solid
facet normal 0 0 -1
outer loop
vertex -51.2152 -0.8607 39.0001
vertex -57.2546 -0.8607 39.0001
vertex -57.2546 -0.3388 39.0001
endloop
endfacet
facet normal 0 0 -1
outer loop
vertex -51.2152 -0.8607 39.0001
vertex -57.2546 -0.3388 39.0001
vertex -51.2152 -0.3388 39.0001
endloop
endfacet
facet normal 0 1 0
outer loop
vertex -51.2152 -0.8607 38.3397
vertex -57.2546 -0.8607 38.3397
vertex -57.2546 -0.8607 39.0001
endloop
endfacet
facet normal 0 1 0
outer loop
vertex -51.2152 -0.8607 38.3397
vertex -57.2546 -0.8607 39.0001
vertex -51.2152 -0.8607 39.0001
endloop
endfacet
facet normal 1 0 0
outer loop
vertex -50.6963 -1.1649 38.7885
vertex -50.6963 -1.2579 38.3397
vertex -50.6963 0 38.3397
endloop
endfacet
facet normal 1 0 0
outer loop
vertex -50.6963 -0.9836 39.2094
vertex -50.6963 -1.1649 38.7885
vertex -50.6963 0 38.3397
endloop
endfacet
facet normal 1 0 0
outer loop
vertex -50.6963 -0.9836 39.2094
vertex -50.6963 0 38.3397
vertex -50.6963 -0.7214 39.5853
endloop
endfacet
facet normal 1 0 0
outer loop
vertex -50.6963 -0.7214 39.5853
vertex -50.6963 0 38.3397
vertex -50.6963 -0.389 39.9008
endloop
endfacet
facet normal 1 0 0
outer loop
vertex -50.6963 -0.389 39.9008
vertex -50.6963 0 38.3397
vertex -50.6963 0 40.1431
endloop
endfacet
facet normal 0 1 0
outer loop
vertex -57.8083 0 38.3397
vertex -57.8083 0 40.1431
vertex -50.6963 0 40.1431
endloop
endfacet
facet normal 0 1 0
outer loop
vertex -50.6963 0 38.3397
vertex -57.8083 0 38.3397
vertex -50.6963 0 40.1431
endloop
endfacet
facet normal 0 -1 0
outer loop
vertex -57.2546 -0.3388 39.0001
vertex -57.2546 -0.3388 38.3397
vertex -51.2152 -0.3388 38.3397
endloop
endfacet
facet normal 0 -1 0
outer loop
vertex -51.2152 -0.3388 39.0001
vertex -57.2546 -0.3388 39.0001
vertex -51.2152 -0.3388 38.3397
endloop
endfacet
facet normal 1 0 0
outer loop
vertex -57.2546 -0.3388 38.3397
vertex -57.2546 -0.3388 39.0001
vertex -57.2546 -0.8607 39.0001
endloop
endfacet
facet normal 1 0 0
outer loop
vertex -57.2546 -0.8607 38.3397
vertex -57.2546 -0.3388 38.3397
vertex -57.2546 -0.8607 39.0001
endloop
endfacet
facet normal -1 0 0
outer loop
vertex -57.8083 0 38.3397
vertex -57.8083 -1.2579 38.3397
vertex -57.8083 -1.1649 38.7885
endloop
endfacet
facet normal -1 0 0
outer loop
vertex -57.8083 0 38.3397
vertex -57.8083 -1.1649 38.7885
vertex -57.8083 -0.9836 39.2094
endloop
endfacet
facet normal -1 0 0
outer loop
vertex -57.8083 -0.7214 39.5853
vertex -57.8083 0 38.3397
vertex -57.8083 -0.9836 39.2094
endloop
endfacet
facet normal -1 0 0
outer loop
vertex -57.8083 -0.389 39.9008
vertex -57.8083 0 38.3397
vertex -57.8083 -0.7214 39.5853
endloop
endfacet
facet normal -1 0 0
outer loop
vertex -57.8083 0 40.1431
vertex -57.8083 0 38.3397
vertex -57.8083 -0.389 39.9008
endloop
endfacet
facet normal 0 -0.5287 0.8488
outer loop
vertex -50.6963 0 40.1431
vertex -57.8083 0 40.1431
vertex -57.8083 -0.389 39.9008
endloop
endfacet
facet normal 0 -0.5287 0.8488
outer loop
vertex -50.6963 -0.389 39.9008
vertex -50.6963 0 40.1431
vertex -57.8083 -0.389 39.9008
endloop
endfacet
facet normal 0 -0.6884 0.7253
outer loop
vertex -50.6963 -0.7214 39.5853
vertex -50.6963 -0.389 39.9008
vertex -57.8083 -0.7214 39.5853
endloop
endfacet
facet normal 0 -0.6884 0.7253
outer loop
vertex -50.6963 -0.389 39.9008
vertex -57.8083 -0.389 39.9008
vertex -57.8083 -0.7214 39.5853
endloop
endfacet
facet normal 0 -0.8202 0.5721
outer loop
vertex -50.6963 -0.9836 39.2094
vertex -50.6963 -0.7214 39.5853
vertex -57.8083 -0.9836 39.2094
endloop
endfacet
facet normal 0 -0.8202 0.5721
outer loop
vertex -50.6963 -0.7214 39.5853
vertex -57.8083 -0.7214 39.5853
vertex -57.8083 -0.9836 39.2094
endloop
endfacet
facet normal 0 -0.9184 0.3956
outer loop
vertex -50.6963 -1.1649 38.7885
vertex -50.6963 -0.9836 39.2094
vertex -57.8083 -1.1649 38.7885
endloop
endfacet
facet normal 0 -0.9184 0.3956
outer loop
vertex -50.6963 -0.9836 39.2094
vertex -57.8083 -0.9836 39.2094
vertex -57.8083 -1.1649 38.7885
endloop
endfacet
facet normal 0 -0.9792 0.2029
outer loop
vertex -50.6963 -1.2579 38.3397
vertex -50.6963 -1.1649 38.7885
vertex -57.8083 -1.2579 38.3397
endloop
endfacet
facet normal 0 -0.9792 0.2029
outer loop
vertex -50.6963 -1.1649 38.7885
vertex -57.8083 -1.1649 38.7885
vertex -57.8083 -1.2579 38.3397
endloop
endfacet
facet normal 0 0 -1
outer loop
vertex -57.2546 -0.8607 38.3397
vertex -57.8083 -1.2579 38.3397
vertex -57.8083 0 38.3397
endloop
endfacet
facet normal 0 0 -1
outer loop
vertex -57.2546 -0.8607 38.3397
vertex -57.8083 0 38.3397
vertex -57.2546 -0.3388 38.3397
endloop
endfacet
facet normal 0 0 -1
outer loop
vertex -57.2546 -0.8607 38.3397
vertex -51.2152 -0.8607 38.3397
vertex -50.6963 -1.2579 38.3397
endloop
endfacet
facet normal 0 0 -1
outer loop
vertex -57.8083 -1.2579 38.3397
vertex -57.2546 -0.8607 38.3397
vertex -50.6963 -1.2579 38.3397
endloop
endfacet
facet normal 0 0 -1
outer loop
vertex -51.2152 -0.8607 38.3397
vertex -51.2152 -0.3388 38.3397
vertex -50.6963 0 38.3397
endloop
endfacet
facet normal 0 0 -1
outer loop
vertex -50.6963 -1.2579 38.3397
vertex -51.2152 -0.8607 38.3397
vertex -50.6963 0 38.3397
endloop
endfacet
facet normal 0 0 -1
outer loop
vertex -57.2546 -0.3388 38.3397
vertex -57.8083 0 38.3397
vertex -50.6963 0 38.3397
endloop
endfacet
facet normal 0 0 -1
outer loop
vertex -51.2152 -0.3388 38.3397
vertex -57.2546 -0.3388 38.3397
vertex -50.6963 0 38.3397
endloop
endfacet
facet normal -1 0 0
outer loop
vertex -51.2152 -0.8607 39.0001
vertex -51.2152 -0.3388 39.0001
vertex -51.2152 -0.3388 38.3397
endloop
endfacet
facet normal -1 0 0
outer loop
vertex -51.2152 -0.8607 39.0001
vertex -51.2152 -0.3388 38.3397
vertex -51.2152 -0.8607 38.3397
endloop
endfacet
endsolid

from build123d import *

# Parameters (mm, degrees)
F0_W        = 7.112
F0_H        = 1.8034
F1_DEPTH    = 1.27
F2_W        = 6.0393624008
F2_H        = 0.5219200684
F3_DEPTH    = 0.6604
F4_T1_DEPTH = 17.2978356076


# Not quite as in the source:
# - a fillet or chamfer that OpenCascade refuses, or shapes differently, is made with other operations: its cross-section is extruded or revolved along the edge and cut away or added


with BuildPart() as f1:
    # F0 (on Front) → F1 (new body)
    with BuildSketch(Plane.XZ):
        with Locations((-54.2522707031, 39.2414294181)):
            Rectangle(F0_W, F0_H)
    extrude(amount=F1_DEPTH)

    # F2 (on face) → F3 (cut)
    with BuildSketch(Plane(origin=(0, 0, 38.3397294181), x_dir=(1, 0, 0), z_dir=(0, 0, -1))):
        with Locations((-54.2349088937, 0.599740466)):
            Rectangle(F2_W, F2_H)
    extrude(amount=-F3_DEPTH, mode=Mode.SUBTRACT)

    # F4: fillet of radius 2.2688779059 on 1 edges, made by hand

    # F4_s2 → F4_t1 (cut)
    with BuildSketch(Plane.YZ.offset(-62.9011885069)):
        with BuildLine():
            ThreePointArc((0, 40.1431294181), (-0.9264972476, 39.3062695365), (-1.27, 38.1059622966))
            Line((-1.27, 38.1059622966), (-1.27, 40.1431294181))
            Line((-1.27, 40.1431294181), (0, 40.1431294181))
        make_face()
    extrude(amount=F4_T1_DEPTH, mode=Mode.SUBTRACT)


solid = f1.part
